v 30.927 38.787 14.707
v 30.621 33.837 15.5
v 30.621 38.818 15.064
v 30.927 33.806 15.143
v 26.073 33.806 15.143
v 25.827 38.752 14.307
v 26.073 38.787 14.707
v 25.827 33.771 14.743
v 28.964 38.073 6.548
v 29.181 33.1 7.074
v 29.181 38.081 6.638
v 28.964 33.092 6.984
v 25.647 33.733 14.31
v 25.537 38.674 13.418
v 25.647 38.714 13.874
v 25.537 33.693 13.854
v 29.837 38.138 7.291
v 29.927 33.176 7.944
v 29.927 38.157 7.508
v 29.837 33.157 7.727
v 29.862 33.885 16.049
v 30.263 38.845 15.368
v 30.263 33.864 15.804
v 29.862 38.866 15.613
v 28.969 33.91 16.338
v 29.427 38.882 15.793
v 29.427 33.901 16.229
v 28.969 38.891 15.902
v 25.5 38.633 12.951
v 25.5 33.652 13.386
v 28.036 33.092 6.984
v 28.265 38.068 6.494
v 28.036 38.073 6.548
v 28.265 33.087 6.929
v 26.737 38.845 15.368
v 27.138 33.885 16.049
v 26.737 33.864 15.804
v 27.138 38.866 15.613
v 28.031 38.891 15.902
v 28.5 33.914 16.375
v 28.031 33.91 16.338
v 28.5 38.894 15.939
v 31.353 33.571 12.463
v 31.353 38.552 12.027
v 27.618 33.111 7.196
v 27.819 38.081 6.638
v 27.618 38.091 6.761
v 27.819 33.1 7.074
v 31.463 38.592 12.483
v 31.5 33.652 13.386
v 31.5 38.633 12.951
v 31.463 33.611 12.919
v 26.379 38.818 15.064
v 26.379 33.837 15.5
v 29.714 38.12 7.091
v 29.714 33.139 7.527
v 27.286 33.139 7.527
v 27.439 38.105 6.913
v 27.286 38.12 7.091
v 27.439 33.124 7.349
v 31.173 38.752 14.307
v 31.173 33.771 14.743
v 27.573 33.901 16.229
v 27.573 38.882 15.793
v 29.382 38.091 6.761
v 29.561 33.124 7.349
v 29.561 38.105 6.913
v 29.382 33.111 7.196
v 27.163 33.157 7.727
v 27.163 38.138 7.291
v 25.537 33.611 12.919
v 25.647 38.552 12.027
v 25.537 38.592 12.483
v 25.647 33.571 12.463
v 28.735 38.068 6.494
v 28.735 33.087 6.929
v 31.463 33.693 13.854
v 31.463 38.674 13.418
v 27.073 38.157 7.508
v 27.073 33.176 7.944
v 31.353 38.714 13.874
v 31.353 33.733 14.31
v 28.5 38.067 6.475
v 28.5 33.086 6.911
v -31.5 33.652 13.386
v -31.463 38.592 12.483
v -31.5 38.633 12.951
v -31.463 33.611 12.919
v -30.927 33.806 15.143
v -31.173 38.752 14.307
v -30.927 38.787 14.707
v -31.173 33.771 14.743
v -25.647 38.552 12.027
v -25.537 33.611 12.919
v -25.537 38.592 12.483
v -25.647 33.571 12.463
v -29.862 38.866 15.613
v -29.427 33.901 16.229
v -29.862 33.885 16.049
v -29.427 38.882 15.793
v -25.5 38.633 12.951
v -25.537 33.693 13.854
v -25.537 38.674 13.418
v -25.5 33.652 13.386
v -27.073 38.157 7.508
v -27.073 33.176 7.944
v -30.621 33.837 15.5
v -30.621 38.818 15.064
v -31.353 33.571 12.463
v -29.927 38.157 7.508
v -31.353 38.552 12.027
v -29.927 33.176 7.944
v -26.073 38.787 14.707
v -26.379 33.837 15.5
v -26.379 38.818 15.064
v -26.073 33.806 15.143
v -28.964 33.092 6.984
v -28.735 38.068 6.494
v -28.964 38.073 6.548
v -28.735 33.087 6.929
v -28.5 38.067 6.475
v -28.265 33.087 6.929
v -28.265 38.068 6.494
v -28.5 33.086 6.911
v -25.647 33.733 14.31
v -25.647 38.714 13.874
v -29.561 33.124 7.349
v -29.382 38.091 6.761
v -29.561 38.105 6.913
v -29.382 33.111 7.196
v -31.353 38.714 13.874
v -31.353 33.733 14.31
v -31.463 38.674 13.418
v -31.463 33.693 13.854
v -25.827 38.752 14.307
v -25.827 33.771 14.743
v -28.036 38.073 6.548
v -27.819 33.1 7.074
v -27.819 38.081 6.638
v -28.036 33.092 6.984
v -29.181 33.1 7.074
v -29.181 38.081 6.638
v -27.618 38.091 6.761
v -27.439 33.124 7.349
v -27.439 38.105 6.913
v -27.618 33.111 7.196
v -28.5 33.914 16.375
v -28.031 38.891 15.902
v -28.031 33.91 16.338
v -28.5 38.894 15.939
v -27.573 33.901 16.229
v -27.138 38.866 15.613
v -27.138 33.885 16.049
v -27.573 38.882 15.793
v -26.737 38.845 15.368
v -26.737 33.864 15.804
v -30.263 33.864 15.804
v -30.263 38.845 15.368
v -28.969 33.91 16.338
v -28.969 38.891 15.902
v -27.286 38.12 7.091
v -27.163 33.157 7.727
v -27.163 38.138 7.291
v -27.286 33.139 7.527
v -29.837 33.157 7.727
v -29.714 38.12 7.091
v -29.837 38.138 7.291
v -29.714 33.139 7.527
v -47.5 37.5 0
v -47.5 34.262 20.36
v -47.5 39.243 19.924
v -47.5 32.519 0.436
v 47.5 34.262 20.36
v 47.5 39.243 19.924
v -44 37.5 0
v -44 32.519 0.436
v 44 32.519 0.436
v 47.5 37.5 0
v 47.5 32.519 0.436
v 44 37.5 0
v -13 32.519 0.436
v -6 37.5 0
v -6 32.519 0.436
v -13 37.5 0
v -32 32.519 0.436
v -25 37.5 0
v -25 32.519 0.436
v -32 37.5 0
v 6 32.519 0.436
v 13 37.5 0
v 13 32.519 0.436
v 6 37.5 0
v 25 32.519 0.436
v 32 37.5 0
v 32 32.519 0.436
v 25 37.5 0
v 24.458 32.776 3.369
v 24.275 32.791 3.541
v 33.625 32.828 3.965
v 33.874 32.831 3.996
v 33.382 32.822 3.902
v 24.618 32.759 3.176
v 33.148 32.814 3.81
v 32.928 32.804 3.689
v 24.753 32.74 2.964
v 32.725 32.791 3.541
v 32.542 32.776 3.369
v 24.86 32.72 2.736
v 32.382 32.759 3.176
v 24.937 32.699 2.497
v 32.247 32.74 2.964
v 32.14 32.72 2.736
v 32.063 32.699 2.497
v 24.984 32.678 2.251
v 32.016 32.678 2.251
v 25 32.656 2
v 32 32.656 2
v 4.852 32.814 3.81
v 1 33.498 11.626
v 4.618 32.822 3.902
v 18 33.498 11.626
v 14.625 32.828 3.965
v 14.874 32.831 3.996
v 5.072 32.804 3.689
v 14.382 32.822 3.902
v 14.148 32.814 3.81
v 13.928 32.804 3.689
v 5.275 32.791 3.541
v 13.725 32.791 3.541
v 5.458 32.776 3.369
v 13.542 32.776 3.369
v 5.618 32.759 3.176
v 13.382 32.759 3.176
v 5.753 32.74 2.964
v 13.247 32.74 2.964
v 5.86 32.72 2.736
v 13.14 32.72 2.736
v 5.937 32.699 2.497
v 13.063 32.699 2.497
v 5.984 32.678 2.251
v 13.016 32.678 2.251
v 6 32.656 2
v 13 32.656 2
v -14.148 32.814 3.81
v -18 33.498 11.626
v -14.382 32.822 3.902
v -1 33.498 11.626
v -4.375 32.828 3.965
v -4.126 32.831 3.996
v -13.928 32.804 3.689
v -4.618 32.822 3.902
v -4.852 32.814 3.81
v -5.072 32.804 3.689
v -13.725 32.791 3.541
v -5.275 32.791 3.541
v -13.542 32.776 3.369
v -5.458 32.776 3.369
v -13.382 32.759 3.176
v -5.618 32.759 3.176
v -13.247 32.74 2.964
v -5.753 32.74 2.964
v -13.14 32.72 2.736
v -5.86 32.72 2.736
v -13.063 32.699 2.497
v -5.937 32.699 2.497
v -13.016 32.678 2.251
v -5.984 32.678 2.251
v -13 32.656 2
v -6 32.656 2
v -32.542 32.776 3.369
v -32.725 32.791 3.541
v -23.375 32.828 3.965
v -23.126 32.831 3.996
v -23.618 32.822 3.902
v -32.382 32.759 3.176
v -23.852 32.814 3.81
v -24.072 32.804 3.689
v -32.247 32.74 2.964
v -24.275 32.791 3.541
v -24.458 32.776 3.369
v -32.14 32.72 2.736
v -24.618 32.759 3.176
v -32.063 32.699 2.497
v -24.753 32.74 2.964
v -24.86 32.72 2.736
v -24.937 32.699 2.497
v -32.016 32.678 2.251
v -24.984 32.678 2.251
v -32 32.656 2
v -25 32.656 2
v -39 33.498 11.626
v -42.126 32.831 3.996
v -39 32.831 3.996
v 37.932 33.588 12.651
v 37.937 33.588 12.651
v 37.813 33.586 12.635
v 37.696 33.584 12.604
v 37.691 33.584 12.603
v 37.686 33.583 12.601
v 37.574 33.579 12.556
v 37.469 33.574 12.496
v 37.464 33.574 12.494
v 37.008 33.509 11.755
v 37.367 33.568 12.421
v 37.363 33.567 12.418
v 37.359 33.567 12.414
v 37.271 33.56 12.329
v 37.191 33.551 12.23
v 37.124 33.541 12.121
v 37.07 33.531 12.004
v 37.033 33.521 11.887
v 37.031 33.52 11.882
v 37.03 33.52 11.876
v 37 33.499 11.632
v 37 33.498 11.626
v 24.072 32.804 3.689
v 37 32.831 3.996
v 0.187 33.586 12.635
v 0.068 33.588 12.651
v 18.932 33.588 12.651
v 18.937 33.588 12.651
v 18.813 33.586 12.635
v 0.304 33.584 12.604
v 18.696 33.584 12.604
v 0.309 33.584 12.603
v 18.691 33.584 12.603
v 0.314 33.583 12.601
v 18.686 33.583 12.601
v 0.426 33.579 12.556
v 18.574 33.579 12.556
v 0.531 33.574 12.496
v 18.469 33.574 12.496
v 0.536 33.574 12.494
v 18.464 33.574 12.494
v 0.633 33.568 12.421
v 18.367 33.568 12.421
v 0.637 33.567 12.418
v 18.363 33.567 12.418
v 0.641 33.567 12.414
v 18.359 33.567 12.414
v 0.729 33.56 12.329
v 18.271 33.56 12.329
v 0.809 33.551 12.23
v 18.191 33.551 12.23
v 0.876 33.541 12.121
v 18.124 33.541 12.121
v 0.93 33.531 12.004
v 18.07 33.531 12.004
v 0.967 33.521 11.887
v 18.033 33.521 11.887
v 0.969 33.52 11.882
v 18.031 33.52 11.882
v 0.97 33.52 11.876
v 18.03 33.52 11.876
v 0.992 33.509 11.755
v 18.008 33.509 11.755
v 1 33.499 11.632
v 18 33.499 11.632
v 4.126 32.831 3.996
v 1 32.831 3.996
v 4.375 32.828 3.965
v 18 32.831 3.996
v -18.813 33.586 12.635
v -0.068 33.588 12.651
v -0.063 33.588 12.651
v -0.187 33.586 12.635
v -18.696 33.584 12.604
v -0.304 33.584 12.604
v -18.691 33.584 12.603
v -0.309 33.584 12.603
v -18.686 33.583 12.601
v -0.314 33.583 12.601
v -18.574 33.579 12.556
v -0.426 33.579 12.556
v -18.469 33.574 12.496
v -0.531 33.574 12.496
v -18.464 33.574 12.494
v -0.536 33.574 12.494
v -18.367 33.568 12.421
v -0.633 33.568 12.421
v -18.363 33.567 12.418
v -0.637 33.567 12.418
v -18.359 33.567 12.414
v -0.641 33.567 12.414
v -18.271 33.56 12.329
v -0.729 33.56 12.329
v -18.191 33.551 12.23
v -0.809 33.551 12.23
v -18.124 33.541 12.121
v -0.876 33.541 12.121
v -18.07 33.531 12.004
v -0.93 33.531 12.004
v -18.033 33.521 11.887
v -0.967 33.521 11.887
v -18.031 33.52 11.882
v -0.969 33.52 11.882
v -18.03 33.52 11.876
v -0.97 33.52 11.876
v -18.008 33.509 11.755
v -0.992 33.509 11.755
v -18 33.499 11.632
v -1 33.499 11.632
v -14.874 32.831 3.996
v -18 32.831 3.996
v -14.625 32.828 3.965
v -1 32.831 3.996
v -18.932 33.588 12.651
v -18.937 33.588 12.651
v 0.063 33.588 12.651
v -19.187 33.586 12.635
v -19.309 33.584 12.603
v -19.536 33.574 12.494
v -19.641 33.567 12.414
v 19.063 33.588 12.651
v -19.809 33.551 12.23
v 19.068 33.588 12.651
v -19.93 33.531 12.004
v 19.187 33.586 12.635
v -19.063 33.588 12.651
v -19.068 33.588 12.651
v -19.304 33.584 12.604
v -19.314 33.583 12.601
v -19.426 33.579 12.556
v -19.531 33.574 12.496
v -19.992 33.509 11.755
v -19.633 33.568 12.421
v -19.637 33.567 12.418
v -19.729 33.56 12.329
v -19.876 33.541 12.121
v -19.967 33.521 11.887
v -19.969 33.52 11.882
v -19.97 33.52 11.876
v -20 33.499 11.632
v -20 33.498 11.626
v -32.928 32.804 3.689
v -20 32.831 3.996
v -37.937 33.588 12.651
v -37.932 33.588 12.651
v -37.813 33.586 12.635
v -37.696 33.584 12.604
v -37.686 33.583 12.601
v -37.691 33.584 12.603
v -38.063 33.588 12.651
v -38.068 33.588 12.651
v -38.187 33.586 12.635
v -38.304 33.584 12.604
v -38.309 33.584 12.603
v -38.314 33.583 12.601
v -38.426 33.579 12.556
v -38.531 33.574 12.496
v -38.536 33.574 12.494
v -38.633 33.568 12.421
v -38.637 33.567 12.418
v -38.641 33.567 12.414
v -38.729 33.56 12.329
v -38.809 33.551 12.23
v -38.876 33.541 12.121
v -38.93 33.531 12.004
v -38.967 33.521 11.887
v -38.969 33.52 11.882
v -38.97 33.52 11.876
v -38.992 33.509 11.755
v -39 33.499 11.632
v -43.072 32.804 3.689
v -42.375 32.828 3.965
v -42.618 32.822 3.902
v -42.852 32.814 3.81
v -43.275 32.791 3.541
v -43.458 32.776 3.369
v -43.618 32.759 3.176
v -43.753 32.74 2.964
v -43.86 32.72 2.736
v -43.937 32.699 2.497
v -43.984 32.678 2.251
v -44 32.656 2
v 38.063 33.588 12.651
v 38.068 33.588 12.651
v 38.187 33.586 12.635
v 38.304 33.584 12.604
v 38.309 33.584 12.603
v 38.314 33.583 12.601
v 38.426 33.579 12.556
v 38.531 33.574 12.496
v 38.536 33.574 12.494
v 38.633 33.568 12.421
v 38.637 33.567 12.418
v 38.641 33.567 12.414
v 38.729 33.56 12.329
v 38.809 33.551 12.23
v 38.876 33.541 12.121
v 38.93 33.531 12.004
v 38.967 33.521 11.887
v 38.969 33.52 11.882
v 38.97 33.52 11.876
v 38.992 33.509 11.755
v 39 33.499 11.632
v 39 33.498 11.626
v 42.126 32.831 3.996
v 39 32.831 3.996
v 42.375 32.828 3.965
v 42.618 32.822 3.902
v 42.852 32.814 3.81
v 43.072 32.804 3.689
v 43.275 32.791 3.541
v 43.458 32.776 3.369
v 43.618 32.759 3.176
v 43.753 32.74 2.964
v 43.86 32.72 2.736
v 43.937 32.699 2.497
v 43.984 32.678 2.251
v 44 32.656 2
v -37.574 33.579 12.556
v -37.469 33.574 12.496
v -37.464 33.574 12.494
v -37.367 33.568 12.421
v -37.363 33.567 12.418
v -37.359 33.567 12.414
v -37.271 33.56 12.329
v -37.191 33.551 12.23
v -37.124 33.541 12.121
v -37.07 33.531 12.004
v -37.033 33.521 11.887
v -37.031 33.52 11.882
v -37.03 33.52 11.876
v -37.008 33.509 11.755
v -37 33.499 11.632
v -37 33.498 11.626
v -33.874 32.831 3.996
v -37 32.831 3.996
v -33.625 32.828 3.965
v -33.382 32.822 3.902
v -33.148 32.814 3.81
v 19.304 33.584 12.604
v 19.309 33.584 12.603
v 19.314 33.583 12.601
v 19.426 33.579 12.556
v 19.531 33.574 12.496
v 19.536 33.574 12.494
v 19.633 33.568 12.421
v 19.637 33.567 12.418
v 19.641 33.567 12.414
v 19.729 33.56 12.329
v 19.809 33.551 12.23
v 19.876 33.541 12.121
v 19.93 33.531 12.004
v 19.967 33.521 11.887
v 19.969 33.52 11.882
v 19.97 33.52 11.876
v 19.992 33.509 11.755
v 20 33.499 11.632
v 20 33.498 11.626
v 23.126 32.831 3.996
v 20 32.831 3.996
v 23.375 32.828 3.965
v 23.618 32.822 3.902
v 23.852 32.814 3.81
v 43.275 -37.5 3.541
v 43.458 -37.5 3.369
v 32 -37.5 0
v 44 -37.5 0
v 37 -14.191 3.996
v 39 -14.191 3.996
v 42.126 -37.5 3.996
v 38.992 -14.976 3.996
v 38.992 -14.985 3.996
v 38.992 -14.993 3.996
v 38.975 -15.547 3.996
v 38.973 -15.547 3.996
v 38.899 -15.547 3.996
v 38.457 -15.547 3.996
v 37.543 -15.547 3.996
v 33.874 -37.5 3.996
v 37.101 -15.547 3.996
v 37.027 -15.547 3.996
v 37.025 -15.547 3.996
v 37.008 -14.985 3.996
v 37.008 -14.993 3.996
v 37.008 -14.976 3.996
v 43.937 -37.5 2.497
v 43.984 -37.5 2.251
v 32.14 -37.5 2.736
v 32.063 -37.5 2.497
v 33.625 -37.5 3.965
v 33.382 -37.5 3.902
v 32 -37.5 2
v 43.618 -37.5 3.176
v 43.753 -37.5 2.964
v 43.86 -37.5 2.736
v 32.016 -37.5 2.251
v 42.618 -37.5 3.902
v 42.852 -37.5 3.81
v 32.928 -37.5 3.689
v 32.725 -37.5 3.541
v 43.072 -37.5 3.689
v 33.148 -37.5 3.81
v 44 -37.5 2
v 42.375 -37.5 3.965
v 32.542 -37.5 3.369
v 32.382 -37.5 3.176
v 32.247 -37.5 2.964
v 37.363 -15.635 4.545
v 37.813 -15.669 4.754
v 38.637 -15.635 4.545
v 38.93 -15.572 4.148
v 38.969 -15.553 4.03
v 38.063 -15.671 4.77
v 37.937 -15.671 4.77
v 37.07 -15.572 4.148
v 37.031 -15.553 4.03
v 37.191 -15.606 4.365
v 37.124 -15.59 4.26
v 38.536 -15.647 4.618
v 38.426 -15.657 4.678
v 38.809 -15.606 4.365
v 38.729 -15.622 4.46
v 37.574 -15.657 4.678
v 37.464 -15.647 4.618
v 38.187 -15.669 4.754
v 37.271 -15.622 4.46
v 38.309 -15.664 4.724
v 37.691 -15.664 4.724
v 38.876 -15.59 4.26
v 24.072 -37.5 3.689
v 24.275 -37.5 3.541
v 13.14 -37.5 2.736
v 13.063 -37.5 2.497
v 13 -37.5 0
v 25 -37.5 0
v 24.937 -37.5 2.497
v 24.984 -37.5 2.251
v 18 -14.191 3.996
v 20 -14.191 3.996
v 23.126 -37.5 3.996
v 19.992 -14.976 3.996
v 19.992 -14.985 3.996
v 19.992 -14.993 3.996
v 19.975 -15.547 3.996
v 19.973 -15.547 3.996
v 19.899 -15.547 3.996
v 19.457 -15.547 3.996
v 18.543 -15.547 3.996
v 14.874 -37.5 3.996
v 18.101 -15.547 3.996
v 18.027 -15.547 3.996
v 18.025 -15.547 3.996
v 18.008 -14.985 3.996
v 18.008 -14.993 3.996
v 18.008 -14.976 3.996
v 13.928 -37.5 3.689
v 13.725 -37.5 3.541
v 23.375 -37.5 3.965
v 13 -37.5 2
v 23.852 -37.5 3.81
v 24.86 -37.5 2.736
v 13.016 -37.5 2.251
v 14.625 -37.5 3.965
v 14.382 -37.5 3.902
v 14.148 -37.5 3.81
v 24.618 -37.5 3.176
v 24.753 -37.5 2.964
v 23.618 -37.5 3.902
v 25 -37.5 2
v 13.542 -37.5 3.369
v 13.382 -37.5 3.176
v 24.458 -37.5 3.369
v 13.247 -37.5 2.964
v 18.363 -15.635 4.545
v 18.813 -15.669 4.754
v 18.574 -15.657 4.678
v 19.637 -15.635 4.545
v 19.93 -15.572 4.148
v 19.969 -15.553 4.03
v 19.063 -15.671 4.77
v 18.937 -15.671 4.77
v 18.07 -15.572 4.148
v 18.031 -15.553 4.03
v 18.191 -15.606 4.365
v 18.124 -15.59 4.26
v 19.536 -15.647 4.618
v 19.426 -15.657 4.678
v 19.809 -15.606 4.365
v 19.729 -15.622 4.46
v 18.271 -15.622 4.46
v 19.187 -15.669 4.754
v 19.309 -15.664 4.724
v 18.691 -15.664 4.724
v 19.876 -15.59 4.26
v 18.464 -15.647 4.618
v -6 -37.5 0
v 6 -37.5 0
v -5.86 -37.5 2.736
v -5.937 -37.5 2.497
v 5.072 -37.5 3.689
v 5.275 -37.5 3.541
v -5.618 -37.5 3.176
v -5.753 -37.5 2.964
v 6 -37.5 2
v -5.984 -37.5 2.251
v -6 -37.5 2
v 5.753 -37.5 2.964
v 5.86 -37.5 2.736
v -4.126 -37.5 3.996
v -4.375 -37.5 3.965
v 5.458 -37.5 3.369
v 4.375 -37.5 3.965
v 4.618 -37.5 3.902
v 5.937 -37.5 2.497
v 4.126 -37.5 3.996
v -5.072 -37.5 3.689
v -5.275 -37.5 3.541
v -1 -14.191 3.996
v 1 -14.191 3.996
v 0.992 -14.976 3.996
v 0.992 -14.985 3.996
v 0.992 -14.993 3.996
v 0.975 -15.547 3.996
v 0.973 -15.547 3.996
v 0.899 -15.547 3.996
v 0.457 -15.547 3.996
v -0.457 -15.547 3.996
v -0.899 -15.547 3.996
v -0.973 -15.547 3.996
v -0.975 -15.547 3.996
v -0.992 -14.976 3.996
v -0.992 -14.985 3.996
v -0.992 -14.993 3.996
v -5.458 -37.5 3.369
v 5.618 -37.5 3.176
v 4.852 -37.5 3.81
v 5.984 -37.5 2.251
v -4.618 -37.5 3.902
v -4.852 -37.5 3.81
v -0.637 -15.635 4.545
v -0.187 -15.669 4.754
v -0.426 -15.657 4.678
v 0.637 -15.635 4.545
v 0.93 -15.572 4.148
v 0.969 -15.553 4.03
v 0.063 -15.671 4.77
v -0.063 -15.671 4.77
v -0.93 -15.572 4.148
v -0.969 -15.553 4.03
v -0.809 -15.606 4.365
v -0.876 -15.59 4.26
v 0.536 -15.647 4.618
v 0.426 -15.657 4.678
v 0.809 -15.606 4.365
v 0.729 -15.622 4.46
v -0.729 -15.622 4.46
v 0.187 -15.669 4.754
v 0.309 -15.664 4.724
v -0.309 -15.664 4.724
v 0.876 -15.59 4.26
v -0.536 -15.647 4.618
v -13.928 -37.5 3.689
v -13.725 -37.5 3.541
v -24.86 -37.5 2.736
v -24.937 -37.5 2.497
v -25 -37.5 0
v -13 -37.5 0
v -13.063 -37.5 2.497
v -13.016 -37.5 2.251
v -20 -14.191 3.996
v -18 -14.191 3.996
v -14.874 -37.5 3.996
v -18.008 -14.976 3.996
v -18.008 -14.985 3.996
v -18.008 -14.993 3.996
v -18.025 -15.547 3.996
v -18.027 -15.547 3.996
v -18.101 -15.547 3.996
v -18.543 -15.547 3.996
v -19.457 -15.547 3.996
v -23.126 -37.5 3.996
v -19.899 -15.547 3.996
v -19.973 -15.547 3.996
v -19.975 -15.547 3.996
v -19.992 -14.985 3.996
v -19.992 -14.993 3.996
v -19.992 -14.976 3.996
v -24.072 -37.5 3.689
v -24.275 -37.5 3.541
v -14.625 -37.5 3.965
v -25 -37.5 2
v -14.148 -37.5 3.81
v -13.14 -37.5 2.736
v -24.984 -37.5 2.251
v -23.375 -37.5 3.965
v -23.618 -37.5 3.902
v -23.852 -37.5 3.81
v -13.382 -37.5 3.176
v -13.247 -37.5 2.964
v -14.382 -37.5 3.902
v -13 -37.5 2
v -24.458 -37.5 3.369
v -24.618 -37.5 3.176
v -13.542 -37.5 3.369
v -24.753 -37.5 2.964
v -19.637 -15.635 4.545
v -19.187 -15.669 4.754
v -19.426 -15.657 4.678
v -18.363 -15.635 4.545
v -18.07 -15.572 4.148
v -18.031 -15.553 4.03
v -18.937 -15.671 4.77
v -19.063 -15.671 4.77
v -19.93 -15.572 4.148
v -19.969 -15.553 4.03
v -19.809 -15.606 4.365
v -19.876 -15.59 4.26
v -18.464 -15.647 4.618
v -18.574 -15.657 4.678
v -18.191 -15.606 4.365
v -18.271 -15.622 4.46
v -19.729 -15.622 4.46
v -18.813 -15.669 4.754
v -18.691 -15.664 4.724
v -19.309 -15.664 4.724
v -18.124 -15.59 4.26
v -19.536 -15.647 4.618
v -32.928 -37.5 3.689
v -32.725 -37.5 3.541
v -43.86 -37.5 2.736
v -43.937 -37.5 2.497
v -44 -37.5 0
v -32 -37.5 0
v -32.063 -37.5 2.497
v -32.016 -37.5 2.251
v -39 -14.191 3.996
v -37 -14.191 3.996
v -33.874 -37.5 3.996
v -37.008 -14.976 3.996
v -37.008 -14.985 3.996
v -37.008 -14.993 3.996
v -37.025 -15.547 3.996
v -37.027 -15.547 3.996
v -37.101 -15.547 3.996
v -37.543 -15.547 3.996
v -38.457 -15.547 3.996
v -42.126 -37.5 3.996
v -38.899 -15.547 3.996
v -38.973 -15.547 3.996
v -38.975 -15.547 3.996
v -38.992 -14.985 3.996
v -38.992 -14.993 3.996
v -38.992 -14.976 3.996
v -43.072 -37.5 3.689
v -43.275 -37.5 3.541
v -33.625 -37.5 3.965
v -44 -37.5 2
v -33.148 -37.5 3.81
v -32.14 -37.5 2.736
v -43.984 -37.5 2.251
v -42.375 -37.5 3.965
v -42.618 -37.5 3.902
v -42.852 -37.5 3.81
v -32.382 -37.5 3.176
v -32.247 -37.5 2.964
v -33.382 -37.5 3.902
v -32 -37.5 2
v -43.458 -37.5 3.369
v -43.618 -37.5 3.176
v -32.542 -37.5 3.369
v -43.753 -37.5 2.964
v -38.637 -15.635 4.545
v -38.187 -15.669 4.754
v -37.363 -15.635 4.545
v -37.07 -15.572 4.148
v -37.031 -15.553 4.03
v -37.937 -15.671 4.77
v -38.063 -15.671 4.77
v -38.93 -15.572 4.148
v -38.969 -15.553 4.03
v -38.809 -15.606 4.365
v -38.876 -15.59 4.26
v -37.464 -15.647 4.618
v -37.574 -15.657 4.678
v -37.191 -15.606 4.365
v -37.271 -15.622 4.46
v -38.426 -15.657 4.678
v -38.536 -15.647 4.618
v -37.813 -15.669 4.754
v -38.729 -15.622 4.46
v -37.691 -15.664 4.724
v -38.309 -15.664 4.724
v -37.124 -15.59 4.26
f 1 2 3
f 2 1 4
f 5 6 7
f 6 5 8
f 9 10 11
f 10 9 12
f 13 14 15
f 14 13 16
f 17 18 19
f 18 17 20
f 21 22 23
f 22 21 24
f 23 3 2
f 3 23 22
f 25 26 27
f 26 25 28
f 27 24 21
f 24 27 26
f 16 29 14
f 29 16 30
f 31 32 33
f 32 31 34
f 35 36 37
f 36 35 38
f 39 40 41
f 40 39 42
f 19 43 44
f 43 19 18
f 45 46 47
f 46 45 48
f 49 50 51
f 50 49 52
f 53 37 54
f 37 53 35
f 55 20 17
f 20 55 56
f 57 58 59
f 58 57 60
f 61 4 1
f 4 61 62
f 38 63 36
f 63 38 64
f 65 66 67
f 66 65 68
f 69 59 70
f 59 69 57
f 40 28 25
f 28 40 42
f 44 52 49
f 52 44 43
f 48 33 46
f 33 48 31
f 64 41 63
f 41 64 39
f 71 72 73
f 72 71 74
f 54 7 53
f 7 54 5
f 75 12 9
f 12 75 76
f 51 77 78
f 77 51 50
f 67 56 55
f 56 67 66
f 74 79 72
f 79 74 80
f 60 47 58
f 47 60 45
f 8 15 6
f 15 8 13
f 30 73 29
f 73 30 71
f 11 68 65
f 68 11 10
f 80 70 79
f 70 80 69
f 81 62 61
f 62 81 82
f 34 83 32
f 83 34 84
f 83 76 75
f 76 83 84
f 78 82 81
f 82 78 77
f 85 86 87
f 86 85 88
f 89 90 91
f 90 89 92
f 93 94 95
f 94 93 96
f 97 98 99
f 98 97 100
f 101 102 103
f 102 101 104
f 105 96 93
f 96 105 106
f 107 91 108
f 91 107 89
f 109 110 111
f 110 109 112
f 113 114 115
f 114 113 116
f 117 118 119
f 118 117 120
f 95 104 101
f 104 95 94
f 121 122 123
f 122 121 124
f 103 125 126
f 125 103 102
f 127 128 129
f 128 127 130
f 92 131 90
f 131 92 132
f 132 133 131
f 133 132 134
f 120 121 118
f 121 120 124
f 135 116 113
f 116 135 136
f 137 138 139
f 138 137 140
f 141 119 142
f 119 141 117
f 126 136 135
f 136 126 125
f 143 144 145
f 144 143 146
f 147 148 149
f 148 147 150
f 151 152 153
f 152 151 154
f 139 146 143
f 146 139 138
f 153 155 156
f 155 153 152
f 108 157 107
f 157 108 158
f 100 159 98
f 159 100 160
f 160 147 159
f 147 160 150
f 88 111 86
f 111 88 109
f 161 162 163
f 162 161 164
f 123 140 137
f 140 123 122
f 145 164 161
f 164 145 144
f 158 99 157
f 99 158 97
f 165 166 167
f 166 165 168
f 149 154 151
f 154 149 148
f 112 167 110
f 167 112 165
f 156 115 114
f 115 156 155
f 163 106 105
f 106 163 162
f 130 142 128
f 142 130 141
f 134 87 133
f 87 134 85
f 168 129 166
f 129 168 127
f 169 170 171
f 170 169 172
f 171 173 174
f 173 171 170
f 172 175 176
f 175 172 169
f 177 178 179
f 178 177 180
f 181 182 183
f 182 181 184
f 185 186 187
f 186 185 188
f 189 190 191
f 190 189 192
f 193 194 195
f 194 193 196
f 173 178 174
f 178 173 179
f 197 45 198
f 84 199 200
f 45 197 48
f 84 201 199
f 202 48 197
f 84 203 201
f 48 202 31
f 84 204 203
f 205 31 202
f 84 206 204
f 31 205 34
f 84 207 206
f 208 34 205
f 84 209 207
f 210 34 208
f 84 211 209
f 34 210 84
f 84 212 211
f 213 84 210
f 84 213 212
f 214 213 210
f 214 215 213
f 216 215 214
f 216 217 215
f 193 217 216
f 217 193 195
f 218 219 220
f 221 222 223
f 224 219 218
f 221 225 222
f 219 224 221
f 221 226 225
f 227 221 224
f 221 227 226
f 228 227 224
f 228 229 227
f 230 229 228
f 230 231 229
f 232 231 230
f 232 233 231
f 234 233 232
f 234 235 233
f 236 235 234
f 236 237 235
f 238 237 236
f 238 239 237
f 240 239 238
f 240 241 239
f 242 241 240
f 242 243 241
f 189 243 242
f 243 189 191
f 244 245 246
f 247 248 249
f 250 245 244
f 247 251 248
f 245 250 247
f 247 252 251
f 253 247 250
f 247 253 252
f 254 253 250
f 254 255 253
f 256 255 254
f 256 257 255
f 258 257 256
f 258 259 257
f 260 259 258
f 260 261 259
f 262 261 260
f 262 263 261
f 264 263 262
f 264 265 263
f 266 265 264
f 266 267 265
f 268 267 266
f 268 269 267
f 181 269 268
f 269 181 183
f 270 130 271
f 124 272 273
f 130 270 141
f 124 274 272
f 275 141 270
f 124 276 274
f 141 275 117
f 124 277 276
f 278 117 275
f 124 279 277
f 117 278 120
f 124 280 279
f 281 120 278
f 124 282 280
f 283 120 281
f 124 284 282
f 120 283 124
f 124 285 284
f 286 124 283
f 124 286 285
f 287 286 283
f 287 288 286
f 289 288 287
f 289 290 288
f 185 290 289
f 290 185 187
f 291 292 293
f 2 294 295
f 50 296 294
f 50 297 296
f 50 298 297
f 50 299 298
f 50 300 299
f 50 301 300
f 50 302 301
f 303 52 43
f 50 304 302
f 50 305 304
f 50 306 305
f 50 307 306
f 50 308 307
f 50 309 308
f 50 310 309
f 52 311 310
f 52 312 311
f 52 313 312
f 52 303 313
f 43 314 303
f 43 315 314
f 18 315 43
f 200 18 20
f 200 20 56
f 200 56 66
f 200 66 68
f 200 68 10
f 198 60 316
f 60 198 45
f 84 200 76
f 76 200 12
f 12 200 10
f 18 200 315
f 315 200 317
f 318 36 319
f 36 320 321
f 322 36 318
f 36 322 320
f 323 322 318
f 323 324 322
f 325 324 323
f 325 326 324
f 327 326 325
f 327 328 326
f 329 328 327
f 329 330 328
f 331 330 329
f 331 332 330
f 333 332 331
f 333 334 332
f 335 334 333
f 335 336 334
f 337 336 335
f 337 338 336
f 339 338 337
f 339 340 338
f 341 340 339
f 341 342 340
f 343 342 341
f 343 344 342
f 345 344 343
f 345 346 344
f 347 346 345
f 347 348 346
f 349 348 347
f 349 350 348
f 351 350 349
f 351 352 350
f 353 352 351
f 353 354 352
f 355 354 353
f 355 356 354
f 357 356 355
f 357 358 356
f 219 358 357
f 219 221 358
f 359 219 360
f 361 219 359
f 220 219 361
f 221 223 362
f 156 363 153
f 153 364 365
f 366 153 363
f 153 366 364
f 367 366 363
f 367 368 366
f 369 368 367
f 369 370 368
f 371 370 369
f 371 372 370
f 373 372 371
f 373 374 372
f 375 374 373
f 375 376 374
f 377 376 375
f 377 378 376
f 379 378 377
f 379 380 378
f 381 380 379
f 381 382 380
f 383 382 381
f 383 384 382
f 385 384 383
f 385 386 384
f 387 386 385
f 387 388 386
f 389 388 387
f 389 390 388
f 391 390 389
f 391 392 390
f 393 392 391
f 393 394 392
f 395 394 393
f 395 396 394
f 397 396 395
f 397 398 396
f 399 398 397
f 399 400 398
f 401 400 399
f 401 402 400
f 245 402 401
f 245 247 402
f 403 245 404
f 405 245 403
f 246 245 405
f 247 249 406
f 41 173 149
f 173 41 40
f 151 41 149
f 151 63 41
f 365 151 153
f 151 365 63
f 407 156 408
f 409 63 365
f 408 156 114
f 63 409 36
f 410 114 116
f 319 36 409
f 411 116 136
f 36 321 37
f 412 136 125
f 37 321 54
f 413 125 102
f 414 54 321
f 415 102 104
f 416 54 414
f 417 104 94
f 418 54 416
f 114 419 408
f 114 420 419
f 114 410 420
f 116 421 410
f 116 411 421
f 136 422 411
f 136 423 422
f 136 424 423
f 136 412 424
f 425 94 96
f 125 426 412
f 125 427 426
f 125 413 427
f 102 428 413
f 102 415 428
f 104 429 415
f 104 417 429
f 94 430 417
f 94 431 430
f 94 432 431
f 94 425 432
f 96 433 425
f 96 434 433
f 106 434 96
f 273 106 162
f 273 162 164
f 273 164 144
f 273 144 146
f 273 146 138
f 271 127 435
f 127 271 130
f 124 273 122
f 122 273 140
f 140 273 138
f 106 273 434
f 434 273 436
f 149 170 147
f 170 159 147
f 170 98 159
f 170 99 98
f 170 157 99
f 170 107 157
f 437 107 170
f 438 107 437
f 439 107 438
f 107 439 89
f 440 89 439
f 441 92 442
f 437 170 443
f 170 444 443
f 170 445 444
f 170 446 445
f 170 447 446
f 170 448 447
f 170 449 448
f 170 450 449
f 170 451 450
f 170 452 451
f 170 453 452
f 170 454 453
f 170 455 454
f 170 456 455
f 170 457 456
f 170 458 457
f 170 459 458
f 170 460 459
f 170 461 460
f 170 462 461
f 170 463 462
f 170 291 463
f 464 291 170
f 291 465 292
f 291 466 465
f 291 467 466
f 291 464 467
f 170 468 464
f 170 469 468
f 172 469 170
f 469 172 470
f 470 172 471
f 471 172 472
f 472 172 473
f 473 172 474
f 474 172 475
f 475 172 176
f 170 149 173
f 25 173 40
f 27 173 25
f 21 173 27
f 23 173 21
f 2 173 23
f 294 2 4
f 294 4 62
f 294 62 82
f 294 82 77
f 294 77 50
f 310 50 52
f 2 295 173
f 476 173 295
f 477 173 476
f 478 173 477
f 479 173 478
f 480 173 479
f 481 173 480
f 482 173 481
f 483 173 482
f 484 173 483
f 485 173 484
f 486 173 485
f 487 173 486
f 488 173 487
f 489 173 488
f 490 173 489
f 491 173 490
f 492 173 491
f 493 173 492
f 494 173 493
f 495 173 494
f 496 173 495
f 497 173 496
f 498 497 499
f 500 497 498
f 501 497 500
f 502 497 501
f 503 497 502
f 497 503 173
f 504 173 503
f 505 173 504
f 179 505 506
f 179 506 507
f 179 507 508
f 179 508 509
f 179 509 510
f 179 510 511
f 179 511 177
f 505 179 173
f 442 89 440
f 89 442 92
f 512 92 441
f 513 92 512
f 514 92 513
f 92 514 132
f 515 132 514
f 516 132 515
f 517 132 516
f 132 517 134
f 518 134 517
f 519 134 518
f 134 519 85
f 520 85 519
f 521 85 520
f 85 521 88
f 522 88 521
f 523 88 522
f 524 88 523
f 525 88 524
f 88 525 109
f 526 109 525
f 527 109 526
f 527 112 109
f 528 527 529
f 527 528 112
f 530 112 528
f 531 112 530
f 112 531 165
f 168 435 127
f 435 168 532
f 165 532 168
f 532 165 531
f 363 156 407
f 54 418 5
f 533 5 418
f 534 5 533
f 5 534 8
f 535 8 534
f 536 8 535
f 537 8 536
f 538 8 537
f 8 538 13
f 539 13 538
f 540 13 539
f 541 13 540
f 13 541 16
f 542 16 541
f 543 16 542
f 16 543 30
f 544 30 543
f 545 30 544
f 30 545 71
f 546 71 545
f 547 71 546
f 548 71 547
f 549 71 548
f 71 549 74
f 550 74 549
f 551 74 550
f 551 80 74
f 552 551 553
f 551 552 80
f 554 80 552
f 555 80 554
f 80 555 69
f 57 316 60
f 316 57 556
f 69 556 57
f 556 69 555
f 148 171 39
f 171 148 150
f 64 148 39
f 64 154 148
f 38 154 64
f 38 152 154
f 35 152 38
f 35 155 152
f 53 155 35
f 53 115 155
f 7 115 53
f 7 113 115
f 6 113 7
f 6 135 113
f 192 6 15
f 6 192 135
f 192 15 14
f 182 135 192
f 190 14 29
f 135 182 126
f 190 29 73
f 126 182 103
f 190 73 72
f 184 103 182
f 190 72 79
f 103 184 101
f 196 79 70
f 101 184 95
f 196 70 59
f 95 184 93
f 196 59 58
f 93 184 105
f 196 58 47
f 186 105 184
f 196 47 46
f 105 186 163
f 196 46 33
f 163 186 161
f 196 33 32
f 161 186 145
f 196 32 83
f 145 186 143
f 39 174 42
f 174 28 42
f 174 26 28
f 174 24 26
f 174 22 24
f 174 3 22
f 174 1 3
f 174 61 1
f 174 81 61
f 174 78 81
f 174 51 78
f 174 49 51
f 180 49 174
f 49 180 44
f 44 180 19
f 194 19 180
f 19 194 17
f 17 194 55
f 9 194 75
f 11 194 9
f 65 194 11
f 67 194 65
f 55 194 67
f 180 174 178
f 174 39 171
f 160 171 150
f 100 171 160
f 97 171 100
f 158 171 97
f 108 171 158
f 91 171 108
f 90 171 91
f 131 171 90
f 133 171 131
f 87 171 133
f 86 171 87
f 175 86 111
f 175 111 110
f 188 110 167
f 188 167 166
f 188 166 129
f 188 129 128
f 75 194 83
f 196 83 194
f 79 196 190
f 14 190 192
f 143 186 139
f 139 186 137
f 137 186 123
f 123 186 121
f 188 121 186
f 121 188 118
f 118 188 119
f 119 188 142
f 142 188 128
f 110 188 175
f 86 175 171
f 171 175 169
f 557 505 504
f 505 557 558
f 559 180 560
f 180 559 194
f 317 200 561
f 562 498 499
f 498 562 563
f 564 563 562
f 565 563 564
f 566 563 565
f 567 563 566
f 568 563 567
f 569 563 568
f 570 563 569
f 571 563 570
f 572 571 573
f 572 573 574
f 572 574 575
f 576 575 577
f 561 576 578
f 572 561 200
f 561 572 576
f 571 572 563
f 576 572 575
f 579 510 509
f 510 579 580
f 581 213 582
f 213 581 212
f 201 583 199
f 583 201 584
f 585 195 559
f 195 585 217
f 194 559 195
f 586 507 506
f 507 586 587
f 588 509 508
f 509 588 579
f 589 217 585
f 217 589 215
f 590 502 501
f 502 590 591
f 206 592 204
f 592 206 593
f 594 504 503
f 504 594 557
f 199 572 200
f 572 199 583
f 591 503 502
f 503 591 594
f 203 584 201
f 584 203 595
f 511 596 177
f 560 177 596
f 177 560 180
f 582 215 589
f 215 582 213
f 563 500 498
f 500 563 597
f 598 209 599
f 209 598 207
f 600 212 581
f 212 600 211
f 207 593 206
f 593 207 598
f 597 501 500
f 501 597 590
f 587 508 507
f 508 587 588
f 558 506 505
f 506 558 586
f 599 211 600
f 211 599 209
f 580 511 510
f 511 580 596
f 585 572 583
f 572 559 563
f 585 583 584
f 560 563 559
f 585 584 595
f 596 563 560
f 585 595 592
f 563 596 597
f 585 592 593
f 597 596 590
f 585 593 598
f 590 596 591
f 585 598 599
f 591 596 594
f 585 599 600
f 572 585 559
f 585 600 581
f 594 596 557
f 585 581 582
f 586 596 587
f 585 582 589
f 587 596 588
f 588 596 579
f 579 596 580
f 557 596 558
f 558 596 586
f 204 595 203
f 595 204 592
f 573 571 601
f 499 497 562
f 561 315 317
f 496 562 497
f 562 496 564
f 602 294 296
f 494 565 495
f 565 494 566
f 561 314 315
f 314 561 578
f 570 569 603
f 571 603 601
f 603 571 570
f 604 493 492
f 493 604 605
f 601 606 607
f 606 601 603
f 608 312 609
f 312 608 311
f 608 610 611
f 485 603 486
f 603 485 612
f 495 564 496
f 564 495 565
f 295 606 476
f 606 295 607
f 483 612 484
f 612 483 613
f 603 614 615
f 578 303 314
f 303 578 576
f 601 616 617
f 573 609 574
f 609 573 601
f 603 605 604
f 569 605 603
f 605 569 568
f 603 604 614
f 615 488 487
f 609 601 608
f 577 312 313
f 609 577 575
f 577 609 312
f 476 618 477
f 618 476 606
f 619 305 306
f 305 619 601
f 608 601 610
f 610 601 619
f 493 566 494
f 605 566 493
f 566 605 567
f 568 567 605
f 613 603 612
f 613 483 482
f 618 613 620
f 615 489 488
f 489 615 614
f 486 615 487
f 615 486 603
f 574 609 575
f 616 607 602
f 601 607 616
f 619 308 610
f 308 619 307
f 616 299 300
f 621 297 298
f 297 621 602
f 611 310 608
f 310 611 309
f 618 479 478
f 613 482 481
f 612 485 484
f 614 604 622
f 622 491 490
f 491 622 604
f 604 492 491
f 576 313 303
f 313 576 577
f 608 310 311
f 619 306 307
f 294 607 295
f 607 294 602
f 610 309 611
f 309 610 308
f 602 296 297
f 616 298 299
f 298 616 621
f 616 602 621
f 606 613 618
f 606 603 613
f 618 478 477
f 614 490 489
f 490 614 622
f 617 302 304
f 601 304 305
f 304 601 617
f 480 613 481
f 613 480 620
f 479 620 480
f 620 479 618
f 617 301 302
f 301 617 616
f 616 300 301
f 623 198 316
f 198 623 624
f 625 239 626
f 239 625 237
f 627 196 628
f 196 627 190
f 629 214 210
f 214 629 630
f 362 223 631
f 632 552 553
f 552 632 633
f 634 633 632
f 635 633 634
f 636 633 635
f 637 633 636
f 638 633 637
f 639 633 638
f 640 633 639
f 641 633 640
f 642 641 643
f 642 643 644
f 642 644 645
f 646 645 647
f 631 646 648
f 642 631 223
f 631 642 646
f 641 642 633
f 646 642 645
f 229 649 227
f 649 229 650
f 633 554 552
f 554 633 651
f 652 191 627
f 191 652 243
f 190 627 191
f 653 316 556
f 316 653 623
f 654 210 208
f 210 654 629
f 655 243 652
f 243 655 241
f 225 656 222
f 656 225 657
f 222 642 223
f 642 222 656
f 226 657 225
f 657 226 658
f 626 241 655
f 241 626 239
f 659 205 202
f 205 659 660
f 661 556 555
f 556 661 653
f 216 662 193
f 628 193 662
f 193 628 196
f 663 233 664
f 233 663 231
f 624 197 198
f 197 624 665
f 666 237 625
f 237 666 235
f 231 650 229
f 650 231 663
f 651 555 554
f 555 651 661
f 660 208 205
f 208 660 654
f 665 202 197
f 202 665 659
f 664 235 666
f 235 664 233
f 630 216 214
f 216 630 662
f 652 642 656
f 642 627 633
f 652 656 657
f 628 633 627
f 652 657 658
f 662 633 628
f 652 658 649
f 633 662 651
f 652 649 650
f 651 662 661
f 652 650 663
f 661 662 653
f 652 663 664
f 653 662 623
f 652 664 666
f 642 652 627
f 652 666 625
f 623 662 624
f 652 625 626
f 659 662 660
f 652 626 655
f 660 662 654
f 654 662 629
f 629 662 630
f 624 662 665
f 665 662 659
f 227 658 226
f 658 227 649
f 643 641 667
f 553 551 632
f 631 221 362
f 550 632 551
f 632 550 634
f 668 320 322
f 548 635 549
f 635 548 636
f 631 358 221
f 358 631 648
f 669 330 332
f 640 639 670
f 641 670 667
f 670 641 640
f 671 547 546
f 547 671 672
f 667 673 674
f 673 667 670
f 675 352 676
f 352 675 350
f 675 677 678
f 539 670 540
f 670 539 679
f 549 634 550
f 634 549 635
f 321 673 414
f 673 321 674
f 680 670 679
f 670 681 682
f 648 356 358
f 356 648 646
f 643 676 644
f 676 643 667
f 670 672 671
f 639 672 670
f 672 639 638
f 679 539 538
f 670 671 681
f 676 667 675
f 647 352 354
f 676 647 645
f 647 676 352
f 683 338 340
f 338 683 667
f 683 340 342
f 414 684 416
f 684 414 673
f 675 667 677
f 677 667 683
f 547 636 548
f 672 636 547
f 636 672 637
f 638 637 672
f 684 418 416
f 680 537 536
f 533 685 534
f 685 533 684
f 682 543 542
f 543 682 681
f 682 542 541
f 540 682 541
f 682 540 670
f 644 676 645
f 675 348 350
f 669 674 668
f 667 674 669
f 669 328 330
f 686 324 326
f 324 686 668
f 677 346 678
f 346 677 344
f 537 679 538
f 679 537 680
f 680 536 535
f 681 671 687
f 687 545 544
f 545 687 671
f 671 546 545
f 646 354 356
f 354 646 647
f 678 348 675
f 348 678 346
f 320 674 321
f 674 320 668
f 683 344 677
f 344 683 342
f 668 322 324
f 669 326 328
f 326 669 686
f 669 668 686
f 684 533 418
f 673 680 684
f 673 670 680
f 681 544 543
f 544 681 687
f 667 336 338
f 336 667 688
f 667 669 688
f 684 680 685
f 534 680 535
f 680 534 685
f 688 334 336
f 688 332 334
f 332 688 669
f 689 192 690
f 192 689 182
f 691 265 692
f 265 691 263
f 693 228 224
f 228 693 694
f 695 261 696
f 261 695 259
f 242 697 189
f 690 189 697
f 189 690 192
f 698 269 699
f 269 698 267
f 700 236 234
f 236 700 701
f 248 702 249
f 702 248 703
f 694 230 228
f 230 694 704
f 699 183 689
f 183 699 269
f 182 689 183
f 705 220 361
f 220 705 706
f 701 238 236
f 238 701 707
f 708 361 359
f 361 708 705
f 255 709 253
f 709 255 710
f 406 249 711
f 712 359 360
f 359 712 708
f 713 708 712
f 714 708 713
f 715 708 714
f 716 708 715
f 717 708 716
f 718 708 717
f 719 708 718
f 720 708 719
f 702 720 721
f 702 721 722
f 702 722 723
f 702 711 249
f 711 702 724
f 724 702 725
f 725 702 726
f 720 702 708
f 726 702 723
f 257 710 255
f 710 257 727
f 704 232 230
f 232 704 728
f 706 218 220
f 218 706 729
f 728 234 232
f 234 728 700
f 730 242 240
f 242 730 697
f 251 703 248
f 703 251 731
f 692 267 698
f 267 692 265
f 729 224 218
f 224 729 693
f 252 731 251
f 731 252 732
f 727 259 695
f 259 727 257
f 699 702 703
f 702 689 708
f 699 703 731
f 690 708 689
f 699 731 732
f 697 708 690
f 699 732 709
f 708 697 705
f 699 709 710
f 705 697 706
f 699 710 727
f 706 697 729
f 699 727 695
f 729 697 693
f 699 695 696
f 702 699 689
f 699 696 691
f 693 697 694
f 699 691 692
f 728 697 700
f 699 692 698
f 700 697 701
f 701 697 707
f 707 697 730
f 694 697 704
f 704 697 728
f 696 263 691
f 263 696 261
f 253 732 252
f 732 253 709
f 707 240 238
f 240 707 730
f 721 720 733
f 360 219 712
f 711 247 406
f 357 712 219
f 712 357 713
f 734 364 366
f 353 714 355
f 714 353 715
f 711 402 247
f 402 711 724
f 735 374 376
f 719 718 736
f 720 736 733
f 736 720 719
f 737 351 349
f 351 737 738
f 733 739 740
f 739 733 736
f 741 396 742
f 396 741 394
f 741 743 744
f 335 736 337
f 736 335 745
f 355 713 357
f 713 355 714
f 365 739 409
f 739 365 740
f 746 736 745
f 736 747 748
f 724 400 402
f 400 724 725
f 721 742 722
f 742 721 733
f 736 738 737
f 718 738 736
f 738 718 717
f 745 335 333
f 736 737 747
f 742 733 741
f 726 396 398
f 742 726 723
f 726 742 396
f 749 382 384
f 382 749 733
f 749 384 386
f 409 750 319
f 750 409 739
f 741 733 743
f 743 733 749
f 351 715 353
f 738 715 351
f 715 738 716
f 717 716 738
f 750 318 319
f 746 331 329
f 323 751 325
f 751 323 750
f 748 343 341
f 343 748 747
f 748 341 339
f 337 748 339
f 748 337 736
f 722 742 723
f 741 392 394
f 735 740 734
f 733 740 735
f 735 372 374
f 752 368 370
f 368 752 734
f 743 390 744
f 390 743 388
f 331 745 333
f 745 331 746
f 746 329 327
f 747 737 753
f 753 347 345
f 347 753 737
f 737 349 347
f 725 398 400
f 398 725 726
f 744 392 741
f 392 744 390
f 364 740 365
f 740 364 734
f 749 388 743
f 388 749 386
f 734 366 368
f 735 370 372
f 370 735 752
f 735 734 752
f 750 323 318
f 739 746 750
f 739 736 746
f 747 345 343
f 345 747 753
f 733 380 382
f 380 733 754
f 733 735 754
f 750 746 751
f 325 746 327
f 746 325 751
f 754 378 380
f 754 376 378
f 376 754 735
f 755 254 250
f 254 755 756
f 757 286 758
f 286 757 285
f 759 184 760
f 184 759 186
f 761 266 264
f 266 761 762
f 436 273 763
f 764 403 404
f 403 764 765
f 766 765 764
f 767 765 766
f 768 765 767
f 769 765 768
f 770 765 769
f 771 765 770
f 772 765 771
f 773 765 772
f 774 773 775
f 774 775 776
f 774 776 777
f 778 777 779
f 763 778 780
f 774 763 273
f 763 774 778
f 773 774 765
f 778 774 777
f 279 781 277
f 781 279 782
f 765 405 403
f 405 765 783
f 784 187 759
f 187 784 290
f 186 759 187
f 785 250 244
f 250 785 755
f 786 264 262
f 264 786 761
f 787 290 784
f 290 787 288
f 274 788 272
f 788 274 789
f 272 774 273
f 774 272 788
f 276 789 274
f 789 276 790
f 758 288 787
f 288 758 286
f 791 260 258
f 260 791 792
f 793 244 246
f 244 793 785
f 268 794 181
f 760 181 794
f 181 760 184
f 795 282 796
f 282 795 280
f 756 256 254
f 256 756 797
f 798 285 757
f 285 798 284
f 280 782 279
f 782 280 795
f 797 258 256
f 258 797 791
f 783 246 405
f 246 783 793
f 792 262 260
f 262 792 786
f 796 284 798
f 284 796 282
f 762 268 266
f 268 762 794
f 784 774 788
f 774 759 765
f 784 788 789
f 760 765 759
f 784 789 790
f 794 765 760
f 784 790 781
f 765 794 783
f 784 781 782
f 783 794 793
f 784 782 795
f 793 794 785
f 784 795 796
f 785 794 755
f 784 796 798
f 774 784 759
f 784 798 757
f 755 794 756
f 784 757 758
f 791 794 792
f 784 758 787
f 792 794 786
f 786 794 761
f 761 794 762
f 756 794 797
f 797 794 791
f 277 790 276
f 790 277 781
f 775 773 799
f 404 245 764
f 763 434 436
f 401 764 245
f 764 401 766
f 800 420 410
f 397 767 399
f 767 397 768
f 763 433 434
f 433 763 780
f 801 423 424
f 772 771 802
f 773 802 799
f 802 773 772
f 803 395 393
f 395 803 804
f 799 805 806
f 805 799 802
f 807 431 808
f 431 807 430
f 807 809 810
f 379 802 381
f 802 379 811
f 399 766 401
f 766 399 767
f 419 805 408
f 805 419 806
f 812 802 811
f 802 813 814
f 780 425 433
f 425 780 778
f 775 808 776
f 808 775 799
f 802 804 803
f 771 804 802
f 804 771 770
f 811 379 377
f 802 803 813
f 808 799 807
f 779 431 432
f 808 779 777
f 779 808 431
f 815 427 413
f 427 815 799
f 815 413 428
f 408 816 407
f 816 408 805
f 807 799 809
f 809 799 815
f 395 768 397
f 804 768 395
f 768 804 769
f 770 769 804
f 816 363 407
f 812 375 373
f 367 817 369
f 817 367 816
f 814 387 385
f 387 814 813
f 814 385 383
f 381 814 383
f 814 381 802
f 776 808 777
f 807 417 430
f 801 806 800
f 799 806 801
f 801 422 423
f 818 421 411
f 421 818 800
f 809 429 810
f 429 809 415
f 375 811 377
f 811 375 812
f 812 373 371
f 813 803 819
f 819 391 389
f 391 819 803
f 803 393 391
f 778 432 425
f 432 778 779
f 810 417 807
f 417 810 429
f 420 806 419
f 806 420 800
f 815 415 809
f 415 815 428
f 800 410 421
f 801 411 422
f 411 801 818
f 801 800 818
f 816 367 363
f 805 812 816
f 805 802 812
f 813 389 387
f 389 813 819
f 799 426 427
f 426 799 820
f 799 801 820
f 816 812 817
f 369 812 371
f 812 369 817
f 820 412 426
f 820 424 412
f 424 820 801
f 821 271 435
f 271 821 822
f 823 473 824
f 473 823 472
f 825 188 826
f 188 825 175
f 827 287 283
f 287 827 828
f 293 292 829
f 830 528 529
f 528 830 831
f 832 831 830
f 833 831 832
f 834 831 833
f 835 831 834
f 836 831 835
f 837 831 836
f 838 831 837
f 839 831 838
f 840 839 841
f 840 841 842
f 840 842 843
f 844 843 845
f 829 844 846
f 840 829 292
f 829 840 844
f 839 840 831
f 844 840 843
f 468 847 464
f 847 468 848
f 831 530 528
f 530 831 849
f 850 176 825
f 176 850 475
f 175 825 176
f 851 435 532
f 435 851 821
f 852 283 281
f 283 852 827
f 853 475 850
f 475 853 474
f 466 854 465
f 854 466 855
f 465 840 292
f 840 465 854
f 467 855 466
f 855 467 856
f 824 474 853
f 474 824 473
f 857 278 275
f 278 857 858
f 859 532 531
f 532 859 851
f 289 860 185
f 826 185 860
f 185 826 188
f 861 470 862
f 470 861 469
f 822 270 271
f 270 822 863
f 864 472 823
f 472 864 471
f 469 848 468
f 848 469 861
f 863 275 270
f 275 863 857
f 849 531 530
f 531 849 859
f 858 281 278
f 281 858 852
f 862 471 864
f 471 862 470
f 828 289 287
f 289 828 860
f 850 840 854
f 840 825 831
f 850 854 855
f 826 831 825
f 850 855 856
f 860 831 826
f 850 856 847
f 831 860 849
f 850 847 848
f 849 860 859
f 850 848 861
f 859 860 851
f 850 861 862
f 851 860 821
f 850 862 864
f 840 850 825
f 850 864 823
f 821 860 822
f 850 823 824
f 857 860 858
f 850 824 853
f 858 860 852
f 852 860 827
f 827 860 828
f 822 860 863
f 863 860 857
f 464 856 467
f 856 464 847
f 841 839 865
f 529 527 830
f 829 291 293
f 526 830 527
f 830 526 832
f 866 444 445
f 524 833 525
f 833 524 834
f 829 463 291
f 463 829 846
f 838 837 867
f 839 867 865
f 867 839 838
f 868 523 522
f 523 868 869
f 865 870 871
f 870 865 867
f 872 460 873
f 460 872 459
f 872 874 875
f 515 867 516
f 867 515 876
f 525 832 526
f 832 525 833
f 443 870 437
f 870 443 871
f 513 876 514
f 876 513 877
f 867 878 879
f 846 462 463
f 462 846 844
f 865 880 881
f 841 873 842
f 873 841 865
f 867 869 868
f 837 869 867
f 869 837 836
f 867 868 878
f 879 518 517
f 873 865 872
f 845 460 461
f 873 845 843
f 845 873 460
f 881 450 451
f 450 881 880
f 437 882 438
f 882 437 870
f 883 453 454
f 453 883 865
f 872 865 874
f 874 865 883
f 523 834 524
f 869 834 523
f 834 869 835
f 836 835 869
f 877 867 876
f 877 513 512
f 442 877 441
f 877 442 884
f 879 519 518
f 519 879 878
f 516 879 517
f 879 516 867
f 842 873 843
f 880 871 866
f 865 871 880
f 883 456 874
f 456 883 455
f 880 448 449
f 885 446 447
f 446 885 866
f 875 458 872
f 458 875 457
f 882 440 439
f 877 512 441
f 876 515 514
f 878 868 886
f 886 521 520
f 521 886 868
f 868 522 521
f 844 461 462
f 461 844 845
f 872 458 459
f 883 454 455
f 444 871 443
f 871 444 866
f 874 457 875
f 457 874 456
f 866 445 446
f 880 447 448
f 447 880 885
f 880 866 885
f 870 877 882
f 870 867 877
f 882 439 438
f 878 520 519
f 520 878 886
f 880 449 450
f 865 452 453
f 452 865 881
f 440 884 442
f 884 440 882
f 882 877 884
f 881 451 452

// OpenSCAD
/******************************************************************************/
/**********                     INFO                                 **********/
/******************************************************************************/

/*
Wall Mount Test lead Hanger Rev 1.1 March 2016
you can adjust the number of fingers, length and gap.  
The wall mount piece will auto adjust total width to accommodate the above parameters
by David Buhler

1.1
-added hole size fix for small finger gaps and large wall mount hole size
-fixed minimum finger length support cylinder length
-adjusted variable settings for customizer so user input doesn't create wierd holes and gaps
-added side trimming to reduce size and plastic use.

*/

/******************************************************************************/
/**********                     Settings                             **********/
/******************************************************************************/
//adjust the follow to meet your needs,  all measurements in mm.

/* [BACK] */
//Height of wall mounting plate
back_height=20;//[12:50]

//Mounting plate thickness
back_thickness=5;//[3:10] 

/* [FINGERS] */
//Finger slope(degrees)
back_tilt=5;//[0:8]

//Number of fingers
numberof_fingers=5;//[3:15]

//Slot length
finger_length=75;//[20:100]

//determines weight holding ability
finger_thickness=4; //[2:7]

//how much room for the clips
finger_width=12; //[5:20]

//how wide the slot will be(cable thickness)
finger_gap=7;//[1:15]

/* [SCREW-HOLES] */
//add mounting holes?
mount_holes="yes";//[yes,no]

//thread size in mm
hole_size=3;//[1:6]

/* [FINGER SHAPE] */
//select one the the two following finger shapes
finger_shape="round";//[round,square]
//Trim the sides?
trim_sides= "no"; // [yes,no]


/* [BUILD PLATE] */
//for display only, doesn't contribute to final object
build_plate_selector = 3; //[0:Replicator 2,1: Replicator,2:Thingomatic,3:Manual]
//when Build Plate Selector is set to "manual" this controls the build plate x dimension
build_plate_manual_x = 200; //[100:400]
//when Build Plate Selector is set to "manual" this controls the build plate y dimension
build_plate_manual_y = 200; //[100:400]
build_plate(build_plate_selector,build_plate_manual_x,build_plate_manual_y);

/******************************************************************************/
/**********                   Variable Calcs                         **********/
/****placement of the finger support structure, no need to adjust these********/
/******************************************************************************/
/* [HIDDEN] */
s_width=finger_width/6; //Support triangle width  could just make a fixed width rather than based on finger width
s_height=back_height/2.5;//Support triangle height based on the back height
s_length=finger_length/3*2;//Support triangle lenght based on the finger length 
s_placement_x=(finger_width/2)-(s_width/2);//where to place the X starting point of the support 
s_placement_y=back_thickness/3; //where to place the Y starting point of the support, /3 to accommodate the back tilt 
s_placement_z=finger_thickness;//where to place the Z starting point of the support 


/******************************************************************************/
/**********                  Make It Happen Stuff                    **********/
/******************************************************************************/

echo ("Project Size (wide x height x finger length " ,numberof_fingers*(finger_width+finger_gap)," x ",back_height," x ",finger_length+back_thickness);

//centre the whole project on x0,y0
rotate ([0,0,180])translate ([-(numberof_fingers*(finger_width+finger_gap))/2,-finger_length/2,0])
    {
    difference()//had to stick three difference calls to trim sides.  weird!
        { 
       if (mount_holes=="yes")
            {
            rotate ([back_tilt,0,0]) 
                difference()
                {
                cube([(numberof_fingers*(finger_width+finger_gap)),back_thickness,back_height]);//make plate with auto width based on fingers+width+gap
                Holes ();
                };
            }
        else
            {
            rotate ([back_tilt,0,0]) 
                cube ([(numberof_fingers*(finger_width+finger_gap)),back_thickness,back_height]);//make plate with auto width based on fingers+width+gap
        }
    trim_sides();
    }
    for (inc=[finger_gap/2:finger_width+finger_gap:(numberof_fingers*(finger_width+finger_gap))-finger_gap]) //auto gen each finger and support placement distance
        {
        difference()//had to stick three difference calls to trim sides.  weird!
            {
        if (finger_shape=="round")
            {
            finger(inc,finger_thickness,finger_width,finger_length);//for rounded couner fingers
            }
        else if(finger_shape=="square")
            {
            translate ([inc,0,0])cube ([finger_width,finger_length,finger_thickness]);//for square fingers
            }
           trim_sides();
           }
         difference()//had to stick three difference calls to trim sides.  weird!
           {
           hull ()//created the support surface along with the rounded edge
            {
            difference ()
                {
                translate ([inc-s_width/2+finger_width/2,s_placement_y,s_placement_z])
                    cube ([s_width,s_length,s_height]);
                rotate ([-atan(s_height/s_length),0,0]) 
                    translate ([inc-.1-s_width+finger_width/2,0-back_thickness,s_height+finger_thickness-.2])
                    cube ([s_width*2,s_length*2,s_height*2]);  
                }
            translate ([inc+s_placement_x+s_width/2,s_placement_y,s_height+finger_thickness]) 
                rotate ([-atan(s_height/s_length)-90,0,0]) 
                cylinder(r=s_width/2,h=s_length+2,$fn=50); 
             }    
            trim_sides();
           }
        }
    }
    
//trims the side of the block to reduce size and unneeded support
module trim_sides()
    {
     if (trim_sides=="yes")
        {
        translate ([-finger_width/2,-5,-0.1]) 
            cube ([finger_width,finger_length+back_thickness+5,back_height+5]);
        translate ([((numberof_fingers)*(finger_width+finger_gap))-finger_gap-finger_width/2,-5,-0.1]) 
            cube ([finger_width,finger_length+back_thickness+5,back_height+5]);   
        }
     }
//creates the rounded fingers
module finger(position,thickness,width,length){
    hull(){
       rotate([-90,0,0])
            translate ([position+thickness/2,-thickness/2,0]) 
            cylinder (r=thickness/2,h=length,$fn=50);//left cylinder
       rotate([-90,0,0])
            translate ([position+width-thickness/2,-thickness/2,0]) 
            cylinder (r=thickness/2,h=length,$fn=50);//right cylinder 
       translate ([position,0,0])
            cube ([width,length,thickness/2]);//flat bottom (top when hanging)
    }
    
}
//creates the hole slots and placement based on number of fingers
module Holes ()
    {
    hole_size= hole_size*3 > back_height ? floor(back_height/5):hole_size; 
    hole_size= hole_size > finger_gap ? finger_gap:(hole_size==finger_gap ? hole_size-1:hole_size);
    if (numberof_fingers<7)
        {
        hull()
            { 
            rotate ([-90,0,0]) 
                translate([finger_width+(finger_gap/2) + finger_gap/2,(-back_height/5*2)-hole_size-2,-2]) 
                cylinder(r=hole_size,h=50,$fn=40);    
            rotate ([-90,0,0]) 
                translate([finger_width+(finger_gap/2) + finger_gap/2,-back_height/5*2,-2]) 
                cylinder(r=hole_size/2,h=50,$fn=40);   
            }
       hull()
            { 
            rotate ([-90,0,0]) 
                translate([((numberof_fingers-1)*(finger_width+finger_gap)),-back_height/5*2-hole_size-2,-2])        
                cylinder(r=hole_size,h=50,$fn=40);    
            rotate ([-90,0,0]) 
                translate([((numberof_fingers-1)*(finger_width+finger_gap)),-back_height/5*2,-2]) 
                cylinder(r=hole_size/2,h=50,$fn=40);   
            }
         } 
     else if (numberof_fingers>6)
        {
        hull()
            { 
            rotate ([-90,0,0]) 
                translate([(finger_width+finger_gap)*2-finger_gap/2,-back_height/5*2-hole_size-2,-2]) 
                cylinder(r=hole_size,h=50,$fn=40);    
            rotate ([-90,0,0]) 
                translate([(finger_width+finger_gap)*2-finger_gap/2,-back_height/5*2,-2]) 
                cylinder(r=hole_size/2,h=50,$fn=40);   
            }
       hull()
            { 
            rotate ([-90,0,0]) 
                translate([((numberof_fingers-2)*(finger_width+finger_gap))-finger_gap/2,-back_height/5*2-hole_size-2,-2])        
                cylinder(r=hole_size,h=50,$fn=40);    
            rotate ([-90,0,0]) 
                translate([((numberof_fingers-2)*(finger_width+finger_gap))-finger_gap/2,-back_height/5*2,-2]) 
                cylinder(r=hole_size/2,h=50,$fn=40);   
            }
         }    
     }
     
//display build plate on screen for reference 
module build_plate(bp,manX,manY){

		translate([0,0,-.52]){
			if(bp == 0){
				%cube([285,153,1],center = true);
			}
			if(bp == 1){
				%cube([225,145,1],center = true);
			}
			if(bp == 2){
				%cube([120,120,1],center = true);
			}
			if(bp == 3){
				%cube([manX,manY,1],center = true);
			}
		
		}
		translate([0,0,-.5]){
			if(bp == 0){
				for(i = [-14:14]){
					translate([i*10,0,0])
					%cube([.5,153,1.01],center = true);
				}
				for(i = [-7:7]){
					translate([0,i*10,0])
					%cube([285,.5,1.01],center = true);
				}	
			}
			if(bp == 1){
				for(i = [-11:11]){
					translate([i*10,0,0])
						%cube([.5,145,1.01],center = true);
				}
				for(i = [-7:7]){
					translate([0,i*10,0])
						%cube([225,.5,1.01],center = true);
				}
			}
			if(bp == 2){
				for(i = [-6:6]){
					translate([i*10,0,0])
						%cube([.5,120,1.01],center = true);
				}
				for(i = [-6:6]){
					translate([0,i*10,0])
						%cube([120,.5,1.01],center = true);
				}
			}
			if(bp == 3){
				for(i = [-(floor(manX/20)):floor(manX/20)]){
					translate([i*10,0,0])
						%cube([.5,manY,1.01],center = true);
				}
				for(i = [-(floor(manY/20)):floor(manY/20)]){
					translate([0,i*10,0])
						%cube([manX,.5,1.01],center = true);
				}
			}
		}
}
